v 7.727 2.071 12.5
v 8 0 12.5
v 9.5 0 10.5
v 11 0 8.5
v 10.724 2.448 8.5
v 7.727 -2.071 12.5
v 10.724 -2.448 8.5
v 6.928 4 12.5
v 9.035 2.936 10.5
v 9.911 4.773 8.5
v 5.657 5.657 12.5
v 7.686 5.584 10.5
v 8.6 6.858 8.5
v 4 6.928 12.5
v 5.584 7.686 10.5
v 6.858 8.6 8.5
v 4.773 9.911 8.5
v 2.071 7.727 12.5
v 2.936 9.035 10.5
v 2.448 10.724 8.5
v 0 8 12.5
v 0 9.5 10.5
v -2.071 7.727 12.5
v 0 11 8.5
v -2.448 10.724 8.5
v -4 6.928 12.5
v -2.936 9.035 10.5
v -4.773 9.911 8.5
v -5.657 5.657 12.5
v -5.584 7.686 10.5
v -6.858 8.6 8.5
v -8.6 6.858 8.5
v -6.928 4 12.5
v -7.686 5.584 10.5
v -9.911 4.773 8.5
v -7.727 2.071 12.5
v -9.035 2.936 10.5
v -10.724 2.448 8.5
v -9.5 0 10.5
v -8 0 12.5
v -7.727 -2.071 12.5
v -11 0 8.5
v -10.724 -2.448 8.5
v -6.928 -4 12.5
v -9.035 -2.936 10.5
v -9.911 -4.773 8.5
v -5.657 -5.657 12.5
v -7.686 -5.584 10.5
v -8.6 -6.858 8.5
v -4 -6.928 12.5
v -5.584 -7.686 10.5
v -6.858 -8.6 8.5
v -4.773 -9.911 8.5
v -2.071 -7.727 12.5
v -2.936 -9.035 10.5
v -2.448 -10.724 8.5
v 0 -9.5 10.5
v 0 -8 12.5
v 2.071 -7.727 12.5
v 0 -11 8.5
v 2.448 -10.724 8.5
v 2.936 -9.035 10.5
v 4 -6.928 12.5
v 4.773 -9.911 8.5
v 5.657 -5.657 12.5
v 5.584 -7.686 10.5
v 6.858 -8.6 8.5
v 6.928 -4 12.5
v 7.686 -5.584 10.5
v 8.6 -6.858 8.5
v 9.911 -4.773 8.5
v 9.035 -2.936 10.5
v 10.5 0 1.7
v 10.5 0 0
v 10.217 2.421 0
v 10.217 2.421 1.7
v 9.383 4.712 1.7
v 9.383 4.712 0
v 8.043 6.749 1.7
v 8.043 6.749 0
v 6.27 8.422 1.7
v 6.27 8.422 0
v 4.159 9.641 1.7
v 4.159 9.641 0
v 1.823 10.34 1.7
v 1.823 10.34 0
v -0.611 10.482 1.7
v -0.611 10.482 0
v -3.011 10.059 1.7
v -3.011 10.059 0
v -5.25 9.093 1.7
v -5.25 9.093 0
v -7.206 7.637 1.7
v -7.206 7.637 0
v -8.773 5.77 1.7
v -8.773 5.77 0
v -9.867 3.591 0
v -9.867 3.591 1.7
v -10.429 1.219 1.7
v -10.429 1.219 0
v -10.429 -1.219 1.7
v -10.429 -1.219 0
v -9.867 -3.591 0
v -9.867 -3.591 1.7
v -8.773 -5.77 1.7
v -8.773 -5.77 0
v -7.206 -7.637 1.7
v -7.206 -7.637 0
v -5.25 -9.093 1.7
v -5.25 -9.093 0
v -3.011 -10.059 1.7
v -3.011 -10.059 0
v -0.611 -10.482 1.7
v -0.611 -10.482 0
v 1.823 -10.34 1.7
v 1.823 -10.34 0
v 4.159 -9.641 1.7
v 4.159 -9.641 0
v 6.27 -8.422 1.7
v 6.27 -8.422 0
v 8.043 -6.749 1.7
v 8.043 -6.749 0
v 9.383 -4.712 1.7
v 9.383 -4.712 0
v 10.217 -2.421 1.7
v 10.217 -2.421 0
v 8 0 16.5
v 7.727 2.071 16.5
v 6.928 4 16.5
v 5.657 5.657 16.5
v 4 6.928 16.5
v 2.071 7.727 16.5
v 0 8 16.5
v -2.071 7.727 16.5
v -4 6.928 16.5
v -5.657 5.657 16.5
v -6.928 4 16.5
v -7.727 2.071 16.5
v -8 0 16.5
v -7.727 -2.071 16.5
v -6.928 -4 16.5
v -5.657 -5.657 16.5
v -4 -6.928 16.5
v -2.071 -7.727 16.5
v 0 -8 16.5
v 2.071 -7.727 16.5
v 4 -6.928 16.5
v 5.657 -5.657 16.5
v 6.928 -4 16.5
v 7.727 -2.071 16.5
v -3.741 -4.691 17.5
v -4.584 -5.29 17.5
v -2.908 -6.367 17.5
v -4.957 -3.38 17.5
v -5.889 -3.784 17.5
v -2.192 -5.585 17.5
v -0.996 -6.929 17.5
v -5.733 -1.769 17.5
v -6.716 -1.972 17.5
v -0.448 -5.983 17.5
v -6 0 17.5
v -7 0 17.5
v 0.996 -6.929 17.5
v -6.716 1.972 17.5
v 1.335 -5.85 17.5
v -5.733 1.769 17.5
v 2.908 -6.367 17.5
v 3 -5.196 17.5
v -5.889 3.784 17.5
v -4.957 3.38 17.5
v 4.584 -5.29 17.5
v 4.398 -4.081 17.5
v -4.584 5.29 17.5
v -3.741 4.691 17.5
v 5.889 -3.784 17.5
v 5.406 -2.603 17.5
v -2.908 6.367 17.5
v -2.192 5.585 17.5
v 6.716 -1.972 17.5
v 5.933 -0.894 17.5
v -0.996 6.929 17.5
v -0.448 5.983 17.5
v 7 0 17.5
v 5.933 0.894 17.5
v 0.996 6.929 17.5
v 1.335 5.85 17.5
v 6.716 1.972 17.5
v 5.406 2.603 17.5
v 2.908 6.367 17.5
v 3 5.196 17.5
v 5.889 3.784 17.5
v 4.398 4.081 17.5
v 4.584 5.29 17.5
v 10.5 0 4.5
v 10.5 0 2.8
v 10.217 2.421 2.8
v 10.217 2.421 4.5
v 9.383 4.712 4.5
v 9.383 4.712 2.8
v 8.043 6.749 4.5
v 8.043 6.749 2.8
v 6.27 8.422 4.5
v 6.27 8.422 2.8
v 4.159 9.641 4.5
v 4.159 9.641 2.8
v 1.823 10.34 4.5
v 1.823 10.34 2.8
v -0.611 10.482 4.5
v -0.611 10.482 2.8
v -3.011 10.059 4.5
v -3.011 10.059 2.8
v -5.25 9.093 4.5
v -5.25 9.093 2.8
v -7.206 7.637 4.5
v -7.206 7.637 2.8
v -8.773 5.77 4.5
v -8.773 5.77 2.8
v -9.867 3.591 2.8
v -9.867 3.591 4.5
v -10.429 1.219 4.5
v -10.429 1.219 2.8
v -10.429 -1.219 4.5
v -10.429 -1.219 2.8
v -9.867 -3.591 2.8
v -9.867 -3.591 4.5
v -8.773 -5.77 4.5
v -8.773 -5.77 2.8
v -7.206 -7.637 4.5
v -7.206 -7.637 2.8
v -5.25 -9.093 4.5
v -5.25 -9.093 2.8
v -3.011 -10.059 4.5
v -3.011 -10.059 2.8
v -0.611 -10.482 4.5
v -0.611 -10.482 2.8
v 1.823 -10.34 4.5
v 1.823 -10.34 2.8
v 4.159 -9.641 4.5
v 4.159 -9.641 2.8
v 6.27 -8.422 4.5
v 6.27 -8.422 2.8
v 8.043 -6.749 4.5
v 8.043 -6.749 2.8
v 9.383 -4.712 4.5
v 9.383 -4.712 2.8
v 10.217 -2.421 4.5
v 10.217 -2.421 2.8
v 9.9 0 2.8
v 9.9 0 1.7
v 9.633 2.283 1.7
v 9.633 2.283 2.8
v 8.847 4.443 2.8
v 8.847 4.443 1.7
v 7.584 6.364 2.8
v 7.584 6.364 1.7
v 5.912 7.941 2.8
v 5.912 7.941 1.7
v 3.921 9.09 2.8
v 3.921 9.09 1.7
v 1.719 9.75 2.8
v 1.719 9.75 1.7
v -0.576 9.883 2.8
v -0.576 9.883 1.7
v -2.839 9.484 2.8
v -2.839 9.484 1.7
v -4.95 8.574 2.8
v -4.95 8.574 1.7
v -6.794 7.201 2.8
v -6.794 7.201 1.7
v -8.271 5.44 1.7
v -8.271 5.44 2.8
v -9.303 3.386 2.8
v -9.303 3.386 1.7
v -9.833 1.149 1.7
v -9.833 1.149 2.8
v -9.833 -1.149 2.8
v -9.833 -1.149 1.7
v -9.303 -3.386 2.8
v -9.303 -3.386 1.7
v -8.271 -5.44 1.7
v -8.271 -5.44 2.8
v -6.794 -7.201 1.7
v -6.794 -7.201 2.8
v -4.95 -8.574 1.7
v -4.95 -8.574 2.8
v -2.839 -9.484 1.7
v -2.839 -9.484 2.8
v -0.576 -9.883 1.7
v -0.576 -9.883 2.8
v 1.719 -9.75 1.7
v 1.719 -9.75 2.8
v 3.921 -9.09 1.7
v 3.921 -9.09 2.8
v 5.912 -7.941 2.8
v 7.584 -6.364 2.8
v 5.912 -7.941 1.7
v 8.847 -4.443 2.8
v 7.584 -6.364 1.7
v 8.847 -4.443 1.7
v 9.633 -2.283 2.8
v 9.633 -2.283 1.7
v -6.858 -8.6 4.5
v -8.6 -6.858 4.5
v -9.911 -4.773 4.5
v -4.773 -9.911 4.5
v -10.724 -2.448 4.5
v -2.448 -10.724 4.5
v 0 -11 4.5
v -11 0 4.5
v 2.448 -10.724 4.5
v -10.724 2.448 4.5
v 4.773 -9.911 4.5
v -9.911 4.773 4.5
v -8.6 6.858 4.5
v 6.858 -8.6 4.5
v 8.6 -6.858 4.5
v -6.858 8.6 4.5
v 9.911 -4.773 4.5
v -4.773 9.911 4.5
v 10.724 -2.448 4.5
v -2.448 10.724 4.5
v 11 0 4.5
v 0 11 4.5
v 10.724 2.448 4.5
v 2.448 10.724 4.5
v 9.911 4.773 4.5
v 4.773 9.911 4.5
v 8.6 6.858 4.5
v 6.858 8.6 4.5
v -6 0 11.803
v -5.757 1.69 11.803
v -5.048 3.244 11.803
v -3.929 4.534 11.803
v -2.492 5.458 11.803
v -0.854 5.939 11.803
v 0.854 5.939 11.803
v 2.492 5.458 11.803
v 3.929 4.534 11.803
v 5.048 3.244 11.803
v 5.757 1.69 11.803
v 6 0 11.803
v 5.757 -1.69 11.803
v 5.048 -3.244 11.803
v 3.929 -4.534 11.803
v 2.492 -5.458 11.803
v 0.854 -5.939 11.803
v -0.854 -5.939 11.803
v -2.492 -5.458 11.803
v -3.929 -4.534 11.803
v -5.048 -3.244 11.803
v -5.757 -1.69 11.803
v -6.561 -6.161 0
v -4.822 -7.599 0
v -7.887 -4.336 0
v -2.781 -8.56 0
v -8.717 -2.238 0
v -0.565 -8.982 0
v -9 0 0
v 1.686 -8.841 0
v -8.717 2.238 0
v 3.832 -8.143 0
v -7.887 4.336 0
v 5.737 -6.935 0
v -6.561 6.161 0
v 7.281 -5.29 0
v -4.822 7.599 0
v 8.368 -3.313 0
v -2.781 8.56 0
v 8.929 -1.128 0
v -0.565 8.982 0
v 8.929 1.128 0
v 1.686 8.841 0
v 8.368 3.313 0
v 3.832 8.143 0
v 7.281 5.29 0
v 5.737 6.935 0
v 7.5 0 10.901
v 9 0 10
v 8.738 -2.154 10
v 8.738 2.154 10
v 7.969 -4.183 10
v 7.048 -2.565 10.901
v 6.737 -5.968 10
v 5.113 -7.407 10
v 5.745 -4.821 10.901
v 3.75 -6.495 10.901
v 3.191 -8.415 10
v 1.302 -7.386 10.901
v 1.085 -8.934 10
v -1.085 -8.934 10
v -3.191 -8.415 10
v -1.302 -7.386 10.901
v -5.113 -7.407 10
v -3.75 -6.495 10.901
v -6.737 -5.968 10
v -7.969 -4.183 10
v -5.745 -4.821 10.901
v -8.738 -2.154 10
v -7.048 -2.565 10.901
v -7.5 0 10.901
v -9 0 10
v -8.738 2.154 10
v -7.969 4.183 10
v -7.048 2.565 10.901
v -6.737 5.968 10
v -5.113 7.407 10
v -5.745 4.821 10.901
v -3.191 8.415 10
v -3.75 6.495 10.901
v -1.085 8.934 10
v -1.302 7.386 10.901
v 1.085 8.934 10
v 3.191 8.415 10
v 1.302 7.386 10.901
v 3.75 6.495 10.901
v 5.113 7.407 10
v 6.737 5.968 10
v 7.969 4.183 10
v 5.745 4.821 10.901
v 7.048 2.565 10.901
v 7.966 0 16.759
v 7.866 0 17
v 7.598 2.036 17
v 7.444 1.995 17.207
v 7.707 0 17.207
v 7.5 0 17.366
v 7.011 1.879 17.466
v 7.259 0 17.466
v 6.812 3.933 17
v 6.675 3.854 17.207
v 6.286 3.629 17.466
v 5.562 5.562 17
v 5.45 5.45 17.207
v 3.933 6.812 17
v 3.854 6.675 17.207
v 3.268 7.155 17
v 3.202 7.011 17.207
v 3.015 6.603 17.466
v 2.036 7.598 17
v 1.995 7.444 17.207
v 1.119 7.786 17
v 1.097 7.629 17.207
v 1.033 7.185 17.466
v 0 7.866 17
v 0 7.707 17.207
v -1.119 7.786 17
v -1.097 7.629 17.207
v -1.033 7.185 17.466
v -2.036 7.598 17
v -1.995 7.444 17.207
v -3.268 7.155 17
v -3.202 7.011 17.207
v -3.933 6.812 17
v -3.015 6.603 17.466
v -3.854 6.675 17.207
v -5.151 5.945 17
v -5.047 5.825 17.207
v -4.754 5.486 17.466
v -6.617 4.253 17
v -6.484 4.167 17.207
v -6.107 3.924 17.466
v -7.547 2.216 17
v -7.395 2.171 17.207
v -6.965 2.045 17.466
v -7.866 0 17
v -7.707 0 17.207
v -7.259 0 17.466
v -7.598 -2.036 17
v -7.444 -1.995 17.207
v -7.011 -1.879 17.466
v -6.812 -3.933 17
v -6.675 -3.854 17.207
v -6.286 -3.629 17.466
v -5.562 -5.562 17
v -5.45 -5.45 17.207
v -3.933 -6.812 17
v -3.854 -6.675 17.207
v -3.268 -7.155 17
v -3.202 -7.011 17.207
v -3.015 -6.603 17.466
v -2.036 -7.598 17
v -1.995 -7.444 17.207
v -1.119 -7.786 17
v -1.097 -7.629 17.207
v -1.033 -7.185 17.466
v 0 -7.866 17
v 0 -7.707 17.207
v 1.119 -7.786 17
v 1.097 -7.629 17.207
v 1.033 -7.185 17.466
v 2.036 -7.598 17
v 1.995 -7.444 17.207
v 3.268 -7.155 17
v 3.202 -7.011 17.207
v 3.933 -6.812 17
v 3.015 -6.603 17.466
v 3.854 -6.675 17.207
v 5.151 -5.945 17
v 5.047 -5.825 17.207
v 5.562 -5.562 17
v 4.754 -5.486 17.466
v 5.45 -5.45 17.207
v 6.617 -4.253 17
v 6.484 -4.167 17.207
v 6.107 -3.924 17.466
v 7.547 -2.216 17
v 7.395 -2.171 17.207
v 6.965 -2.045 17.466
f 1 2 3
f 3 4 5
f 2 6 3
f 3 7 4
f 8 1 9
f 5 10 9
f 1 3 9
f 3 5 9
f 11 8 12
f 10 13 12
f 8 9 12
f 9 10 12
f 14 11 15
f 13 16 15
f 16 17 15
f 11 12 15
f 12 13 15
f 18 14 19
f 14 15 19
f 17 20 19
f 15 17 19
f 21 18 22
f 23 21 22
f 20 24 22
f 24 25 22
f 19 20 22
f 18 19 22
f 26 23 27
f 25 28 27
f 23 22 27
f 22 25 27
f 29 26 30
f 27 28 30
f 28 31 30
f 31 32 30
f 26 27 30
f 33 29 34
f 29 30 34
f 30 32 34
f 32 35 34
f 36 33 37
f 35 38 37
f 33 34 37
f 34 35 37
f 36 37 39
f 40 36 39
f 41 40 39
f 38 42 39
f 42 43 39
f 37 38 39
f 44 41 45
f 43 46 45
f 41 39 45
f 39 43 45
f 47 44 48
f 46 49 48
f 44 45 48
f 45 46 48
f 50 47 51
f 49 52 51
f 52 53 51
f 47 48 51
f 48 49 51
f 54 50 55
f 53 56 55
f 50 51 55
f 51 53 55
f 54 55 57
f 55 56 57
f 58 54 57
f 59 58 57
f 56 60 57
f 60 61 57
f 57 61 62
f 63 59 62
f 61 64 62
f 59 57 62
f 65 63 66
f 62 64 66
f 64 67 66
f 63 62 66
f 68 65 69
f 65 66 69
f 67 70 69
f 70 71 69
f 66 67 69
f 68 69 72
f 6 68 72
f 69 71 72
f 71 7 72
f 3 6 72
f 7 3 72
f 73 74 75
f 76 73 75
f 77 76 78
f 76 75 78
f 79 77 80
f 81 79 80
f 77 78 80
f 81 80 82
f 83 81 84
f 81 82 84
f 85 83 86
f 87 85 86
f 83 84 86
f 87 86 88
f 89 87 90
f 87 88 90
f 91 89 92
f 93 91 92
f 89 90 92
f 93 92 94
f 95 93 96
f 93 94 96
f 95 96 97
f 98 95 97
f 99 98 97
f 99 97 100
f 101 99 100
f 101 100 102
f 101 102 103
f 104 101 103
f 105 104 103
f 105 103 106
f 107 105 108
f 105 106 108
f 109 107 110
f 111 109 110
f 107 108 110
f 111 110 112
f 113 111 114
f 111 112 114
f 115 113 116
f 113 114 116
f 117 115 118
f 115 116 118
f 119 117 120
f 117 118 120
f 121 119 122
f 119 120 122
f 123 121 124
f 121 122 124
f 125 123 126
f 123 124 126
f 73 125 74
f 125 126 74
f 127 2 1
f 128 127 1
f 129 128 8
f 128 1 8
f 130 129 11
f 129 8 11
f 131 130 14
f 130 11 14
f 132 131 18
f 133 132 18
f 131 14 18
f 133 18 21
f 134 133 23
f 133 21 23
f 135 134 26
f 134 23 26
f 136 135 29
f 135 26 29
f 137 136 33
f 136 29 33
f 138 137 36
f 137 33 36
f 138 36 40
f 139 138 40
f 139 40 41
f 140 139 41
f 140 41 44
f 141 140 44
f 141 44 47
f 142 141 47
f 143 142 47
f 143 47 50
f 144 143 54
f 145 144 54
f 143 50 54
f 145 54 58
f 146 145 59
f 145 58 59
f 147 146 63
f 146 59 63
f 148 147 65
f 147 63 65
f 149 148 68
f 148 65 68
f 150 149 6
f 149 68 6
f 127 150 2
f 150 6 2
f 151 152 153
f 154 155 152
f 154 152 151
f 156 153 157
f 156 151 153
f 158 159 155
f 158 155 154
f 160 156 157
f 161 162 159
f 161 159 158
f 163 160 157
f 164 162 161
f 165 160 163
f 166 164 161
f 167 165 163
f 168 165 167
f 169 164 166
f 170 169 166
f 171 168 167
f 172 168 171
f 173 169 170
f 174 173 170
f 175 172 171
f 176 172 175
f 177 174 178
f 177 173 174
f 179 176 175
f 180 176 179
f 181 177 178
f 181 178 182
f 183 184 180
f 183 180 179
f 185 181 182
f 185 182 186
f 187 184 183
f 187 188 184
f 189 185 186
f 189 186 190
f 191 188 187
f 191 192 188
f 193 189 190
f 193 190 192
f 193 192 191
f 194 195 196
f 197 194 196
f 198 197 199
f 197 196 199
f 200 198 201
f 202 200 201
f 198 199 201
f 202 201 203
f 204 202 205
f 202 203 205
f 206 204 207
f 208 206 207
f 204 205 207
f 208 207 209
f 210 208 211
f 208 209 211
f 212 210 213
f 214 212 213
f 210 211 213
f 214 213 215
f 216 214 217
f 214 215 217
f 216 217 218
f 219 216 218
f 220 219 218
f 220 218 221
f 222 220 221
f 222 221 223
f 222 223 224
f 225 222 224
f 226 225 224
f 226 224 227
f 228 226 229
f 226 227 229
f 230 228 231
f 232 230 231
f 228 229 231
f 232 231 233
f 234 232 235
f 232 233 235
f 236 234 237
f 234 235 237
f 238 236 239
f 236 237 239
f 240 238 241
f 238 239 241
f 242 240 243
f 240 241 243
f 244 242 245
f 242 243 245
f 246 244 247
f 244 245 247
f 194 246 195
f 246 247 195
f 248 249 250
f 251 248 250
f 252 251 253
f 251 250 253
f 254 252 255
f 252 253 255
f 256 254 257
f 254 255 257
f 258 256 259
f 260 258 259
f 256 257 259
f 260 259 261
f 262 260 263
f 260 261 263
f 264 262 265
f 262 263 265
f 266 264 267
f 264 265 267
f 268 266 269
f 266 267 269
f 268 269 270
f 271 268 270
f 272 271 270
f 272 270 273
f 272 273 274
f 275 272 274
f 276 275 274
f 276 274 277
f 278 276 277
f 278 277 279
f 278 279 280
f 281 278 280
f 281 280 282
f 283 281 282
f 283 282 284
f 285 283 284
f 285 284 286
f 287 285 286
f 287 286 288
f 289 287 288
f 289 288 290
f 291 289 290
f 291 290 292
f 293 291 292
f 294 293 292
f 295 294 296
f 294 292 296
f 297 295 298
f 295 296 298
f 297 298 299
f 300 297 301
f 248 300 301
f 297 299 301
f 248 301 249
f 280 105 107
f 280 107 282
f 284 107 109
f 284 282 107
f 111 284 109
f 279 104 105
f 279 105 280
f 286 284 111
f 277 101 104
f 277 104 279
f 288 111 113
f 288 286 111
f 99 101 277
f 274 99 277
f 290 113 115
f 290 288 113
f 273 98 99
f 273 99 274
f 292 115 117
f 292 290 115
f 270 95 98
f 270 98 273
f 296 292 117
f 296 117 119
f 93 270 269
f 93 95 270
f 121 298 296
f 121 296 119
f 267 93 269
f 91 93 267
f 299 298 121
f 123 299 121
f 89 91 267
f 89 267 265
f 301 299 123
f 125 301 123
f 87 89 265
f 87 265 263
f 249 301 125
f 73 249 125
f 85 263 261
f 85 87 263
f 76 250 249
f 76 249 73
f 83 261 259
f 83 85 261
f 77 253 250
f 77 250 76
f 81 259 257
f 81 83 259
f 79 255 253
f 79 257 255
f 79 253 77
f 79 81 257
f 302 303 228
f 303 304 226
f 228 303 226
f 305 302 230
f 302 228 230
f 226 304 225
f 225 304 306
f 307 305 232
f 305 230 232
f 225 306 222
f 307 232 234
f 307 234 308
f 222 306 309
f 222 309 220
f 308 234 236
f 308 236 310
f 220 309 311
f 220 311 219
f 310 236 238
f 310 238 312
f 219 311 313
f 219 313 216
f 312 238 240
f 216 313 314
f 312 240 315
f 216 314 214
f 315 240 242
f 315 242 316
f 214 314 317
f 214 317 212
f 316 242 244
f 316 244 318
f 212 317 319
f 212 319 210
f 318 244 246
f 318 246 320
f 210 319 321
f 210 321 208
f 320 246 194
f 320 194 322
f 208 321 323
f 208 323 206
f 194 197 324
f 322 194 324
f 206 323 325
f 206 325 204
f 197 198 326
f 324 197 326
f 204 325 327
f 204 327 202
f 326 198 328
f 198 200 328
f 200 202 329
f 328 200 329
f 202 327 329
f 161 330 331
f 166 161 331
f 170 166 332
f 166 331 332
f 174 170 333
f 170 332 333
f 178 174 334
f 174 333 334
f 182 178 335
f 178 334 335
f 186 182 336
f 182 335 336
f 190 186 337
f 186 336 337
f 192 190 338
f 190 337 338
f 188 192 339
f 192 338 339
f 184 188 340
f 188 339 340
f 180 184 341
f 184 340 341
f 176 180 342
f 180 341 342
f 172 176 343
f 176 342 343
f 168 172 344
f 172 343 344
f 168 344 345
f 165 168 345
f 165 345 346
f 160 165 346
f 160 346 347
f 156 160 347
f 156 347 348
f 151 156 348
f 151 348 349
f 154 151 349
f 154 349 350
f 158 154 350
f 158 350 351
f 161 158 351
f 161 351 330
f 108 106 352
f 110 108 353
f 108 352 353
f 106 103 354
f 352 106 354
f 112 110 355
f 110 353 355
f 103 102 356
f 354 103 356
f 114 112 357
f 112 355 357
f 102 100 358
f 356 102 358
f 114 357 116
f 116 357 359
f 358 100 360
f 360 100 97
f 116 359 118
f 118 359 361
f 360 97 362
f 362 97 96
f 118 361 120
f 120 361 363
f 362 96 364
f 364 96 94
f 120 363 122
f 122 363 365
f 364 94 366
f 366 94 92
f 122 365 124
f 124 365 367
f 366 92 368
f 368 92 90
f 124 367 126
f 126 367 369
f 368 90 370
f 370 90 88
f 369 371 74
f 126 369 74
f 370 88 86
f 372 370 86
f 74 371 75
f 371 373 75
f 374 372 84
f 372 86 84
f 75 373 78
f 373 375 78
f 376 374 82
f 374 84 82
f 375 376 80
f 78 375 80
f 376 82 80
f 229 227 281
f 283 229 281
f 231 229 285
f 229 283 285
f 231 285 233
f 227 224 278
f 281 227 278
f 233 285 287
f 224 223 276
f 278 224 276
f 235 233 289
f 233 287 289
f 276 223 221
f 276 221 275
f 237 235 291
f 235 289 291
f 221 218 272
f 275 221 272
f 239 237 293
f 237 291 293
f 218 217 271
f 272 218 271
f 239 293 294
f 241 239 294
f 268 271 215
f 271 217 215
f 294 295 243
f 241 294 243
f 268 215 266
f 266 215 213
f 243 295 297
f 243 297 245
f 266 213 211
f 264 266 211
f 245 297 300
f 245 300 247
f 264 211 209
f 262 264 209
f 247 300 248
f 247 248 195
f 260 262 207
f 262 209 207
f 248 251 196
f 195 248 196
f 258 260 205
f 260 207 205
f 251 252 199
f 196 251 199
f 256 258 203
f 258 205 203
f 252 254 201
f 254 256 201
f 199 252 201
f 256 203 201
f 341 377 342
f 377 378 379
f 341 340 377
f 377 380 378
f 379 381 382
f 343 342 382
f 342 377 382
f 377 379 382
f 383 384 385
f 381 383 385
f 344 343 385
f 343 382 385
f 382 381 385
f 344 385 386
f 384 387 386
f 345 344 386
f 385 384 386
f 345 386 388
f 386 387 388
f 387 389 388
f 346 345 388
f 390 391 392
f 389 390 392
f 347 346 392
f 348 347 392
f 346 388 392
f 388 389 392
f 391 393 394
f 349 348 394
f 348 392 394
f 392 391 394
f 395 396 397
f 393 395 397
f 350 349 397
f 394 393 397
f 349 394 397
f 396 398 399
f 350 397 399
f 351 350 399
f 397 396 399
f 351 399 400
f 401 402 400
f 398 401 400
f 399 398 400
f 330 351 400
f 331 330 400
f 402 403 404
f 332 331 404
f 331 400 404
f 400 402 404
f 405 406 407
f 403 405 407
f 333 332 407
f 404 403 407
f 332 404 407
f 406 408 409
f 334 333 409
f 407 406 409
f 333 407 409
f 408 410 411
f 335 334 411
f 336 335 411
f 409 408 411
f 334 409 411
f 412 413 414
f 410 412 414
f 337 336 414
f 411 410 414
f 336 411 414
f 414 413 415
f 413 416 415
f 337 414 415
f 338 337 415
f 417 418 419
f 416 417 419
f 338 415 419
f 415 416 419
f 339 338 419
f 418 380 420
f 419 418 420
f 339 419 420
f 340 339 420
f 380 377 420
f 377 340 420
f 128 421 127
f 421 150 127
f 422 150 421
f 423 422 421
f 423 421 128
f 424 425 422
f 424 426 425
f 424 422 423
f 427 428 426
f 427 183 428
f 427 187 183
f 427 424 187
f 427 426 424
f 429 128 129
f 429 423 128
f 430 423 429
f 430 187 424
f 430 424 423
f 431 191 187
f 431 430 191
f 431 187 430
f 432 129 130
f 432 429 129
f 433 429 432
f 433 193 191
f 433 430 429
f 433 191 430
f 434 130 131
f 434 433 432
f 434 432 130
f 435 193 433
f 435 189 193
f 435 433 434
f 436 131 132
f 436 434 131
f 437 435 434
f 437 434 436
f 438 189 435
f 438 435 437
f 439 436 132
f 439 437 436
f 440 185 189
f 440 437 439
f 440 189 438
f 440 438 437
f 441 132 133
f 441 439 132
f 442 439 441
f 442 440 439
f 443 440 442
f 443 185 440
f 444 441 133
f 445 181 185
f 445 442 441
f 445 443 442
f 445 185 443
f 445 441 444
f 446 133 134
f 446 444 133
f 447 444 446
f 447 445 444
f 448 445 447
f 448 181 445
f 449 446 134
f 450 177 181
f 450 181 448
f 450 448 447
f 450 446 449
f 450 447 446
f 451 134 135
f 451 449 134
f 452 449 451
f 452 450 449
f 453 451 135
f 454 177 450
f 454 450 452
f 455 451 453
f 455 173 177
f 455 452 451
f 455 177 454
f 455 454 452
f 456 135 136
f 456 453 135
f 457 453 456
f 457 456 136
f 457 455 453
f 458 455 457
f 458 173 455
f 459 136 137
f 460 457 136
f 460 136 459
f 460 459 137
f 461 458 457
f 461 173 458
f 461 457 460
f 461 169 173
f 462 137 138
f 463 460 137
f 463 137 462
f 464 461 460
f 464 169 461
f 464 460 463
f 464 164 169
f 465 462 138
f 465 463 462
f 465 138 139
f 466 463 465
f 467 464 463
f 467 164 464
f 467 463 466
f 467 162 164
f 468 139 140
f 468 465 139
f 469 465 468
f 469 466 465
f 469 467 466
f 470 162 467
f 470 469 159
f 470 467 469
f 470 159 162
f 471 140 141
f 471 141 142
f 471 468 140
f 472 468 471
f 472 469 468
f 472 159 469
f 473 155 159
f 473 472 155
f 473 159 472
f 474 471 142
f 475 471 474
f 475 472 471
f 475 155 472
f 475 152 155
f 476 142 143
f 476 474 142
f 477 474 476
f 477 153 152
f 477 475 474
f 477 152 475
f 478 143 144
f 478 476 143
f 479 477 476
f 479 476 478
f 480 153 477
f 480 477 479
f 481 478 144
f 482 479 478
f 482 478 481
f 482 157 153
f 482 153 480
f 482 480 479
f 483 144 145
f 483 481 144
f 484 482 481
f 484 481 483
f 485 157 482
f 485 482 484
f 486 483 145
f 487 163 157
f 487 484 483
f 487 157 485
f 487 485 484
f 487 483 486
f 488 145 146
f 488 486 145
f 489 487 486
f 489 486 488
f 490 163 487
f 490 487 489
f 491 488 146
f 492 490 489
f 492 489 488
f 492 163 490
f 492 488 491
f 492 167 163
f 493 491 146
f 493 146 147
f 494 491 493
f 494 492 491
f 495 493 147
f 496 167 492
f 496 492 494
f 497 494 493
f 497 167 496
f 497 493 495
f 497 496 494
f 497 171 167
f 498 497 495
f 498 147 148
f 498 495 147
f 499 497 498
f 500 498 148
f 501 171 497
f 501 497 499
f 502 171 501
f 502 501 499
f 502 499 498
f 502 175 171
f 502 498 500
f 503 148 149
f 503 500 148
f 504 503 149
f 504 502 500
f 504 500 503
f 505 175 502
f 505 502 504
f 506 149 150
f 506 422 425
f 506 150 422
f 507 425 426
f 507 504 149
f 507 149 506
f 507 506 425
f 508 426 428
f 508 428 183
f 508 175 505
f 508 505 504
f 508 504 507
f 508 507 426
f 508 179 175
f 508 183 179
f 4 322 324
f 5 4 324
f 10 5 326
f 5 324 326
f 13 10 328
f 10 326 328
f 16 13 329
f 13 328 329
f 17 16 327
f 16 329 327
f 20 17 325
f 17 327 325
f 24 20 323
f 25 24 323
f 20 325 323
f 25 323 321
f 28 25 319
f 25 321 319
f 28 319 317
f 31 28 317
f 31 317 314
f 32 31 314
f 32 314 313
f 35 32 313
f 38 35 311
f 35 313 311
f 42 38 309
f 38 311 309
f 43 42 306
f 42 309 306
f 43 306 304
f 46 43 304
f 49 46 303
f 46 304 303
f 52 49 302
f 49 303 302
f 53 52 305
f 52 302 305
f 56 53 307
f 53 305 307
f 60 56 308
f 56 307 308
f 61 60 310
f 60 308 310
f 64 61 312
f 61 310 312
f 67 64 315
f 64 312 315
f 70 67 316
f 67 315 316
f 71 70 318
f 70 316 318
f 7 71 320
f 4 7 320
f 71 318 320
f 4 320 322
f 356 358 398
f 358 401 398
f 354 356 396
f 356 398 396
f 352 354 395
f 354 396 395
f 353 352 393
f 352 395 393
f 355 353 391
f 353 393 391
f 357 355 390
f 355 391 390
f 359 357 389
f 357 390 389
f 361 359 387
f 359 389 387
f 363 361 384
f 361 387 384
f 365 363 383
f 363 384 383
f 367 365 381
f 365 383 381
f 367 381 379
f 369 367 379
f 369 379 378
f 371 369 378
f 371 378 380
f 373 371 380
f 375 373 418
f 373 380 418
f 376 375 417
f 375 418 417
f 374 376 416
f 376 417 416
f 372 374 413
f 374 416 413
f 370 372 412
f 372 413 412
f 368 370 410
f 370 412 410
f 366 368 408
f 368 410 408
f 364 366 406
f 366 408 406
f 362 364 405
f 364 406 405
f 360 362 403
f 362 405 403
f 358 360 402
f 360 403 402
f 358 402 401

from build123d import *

# Parameters (mm, degrees)
F0_R      = 10.5
F0_R_2    = 9.9
F1_DEPTH  = 1.7
F2_DEPTH  = 2.8
F3_R      = 10.5
F4_DEPTH  = 1.7
F5_R      = 11
F6_DEPTH  = 8
F7_SIZE2  = 4
F7_SIZE   = 3
F8_R      = 8
F9_DEPTH  = 5
F11_D     = 18
F11_DEPTH = 10
F11_TIP   = 5.4077455712
F13_D     = 12
F14_R     = 1


with BuildPart() as f1:
    # F0 (on Top) → F1 (new body)
    with BuildSketch(Plane.XY):
        Circle(F0_R)
        Circle(F0_R_2, mode=Mode.SUBTRACT)
    extrude(amount=F1_DEPTH)

    # F0 (on Top) → F2 (join)
    with BuildSketch(Plane.XY):
        Circle(F0_R_2)
    extrude(amount=F2_DEPTH)

    # F3 (on face) → F4 (join)
    with BuildSketch(Plane.XY.offset(2.8)):
        Circle(F3_R)
    extrude(amount=F4_DEPTH)

    # F5 (on face) → F6 (join)
    with BuildSketch(Plane.XY.offset(4.5)):
        Circle(F5_R)
    extrude(amount=F6_DEPTH)

    # F7
    f7_edges = [f1.edges().sort_by_distance(p)[0] for p in [
        (-11, 0, 12.5),
    ]]
    f7_side = f1.faces().sort_by_distance((0, 0, 12.5))[0]
    chamfer(f7_edges, length=F7_SIZE, length2=F7_SIZE2, reference=f7_side)

    # F8 (on face) → F9 (join)
    with BuildSketch(Plane.XY.offset(12.5)):
        Circle(F8_R)
    extrude(amount=F9_DEPTH)

    # F11
    with Locations(Plane(origin=(0, 0, 0), x_dir=(1, 0, 0), z_dir=(0, 0, -1))):
        with Locations((0, 0)):
            Hole(F11_D / 2, depth=F11_DEPTH)
            with Locations((0, 0, -(F11_DEPTH + F11_TIP / 2))):  # 118° drill point
                Cone(0, F11_D / 2, F11_TIP, mode=Mode.SUBTRACT)

    # F13 (through all)
    with Locations(Plane.XY.offset(17.5)):
        with Locations((0, 0)):
            Hole(F13_D / 2)

    # F14
    f14_edges = [f1.edges().sort_by_distance(p)[0] for p in [
        (-8, 0, 17.5),
    ]]
    fillet(f14_edges, radius=F14_R)


solid = f1.part
